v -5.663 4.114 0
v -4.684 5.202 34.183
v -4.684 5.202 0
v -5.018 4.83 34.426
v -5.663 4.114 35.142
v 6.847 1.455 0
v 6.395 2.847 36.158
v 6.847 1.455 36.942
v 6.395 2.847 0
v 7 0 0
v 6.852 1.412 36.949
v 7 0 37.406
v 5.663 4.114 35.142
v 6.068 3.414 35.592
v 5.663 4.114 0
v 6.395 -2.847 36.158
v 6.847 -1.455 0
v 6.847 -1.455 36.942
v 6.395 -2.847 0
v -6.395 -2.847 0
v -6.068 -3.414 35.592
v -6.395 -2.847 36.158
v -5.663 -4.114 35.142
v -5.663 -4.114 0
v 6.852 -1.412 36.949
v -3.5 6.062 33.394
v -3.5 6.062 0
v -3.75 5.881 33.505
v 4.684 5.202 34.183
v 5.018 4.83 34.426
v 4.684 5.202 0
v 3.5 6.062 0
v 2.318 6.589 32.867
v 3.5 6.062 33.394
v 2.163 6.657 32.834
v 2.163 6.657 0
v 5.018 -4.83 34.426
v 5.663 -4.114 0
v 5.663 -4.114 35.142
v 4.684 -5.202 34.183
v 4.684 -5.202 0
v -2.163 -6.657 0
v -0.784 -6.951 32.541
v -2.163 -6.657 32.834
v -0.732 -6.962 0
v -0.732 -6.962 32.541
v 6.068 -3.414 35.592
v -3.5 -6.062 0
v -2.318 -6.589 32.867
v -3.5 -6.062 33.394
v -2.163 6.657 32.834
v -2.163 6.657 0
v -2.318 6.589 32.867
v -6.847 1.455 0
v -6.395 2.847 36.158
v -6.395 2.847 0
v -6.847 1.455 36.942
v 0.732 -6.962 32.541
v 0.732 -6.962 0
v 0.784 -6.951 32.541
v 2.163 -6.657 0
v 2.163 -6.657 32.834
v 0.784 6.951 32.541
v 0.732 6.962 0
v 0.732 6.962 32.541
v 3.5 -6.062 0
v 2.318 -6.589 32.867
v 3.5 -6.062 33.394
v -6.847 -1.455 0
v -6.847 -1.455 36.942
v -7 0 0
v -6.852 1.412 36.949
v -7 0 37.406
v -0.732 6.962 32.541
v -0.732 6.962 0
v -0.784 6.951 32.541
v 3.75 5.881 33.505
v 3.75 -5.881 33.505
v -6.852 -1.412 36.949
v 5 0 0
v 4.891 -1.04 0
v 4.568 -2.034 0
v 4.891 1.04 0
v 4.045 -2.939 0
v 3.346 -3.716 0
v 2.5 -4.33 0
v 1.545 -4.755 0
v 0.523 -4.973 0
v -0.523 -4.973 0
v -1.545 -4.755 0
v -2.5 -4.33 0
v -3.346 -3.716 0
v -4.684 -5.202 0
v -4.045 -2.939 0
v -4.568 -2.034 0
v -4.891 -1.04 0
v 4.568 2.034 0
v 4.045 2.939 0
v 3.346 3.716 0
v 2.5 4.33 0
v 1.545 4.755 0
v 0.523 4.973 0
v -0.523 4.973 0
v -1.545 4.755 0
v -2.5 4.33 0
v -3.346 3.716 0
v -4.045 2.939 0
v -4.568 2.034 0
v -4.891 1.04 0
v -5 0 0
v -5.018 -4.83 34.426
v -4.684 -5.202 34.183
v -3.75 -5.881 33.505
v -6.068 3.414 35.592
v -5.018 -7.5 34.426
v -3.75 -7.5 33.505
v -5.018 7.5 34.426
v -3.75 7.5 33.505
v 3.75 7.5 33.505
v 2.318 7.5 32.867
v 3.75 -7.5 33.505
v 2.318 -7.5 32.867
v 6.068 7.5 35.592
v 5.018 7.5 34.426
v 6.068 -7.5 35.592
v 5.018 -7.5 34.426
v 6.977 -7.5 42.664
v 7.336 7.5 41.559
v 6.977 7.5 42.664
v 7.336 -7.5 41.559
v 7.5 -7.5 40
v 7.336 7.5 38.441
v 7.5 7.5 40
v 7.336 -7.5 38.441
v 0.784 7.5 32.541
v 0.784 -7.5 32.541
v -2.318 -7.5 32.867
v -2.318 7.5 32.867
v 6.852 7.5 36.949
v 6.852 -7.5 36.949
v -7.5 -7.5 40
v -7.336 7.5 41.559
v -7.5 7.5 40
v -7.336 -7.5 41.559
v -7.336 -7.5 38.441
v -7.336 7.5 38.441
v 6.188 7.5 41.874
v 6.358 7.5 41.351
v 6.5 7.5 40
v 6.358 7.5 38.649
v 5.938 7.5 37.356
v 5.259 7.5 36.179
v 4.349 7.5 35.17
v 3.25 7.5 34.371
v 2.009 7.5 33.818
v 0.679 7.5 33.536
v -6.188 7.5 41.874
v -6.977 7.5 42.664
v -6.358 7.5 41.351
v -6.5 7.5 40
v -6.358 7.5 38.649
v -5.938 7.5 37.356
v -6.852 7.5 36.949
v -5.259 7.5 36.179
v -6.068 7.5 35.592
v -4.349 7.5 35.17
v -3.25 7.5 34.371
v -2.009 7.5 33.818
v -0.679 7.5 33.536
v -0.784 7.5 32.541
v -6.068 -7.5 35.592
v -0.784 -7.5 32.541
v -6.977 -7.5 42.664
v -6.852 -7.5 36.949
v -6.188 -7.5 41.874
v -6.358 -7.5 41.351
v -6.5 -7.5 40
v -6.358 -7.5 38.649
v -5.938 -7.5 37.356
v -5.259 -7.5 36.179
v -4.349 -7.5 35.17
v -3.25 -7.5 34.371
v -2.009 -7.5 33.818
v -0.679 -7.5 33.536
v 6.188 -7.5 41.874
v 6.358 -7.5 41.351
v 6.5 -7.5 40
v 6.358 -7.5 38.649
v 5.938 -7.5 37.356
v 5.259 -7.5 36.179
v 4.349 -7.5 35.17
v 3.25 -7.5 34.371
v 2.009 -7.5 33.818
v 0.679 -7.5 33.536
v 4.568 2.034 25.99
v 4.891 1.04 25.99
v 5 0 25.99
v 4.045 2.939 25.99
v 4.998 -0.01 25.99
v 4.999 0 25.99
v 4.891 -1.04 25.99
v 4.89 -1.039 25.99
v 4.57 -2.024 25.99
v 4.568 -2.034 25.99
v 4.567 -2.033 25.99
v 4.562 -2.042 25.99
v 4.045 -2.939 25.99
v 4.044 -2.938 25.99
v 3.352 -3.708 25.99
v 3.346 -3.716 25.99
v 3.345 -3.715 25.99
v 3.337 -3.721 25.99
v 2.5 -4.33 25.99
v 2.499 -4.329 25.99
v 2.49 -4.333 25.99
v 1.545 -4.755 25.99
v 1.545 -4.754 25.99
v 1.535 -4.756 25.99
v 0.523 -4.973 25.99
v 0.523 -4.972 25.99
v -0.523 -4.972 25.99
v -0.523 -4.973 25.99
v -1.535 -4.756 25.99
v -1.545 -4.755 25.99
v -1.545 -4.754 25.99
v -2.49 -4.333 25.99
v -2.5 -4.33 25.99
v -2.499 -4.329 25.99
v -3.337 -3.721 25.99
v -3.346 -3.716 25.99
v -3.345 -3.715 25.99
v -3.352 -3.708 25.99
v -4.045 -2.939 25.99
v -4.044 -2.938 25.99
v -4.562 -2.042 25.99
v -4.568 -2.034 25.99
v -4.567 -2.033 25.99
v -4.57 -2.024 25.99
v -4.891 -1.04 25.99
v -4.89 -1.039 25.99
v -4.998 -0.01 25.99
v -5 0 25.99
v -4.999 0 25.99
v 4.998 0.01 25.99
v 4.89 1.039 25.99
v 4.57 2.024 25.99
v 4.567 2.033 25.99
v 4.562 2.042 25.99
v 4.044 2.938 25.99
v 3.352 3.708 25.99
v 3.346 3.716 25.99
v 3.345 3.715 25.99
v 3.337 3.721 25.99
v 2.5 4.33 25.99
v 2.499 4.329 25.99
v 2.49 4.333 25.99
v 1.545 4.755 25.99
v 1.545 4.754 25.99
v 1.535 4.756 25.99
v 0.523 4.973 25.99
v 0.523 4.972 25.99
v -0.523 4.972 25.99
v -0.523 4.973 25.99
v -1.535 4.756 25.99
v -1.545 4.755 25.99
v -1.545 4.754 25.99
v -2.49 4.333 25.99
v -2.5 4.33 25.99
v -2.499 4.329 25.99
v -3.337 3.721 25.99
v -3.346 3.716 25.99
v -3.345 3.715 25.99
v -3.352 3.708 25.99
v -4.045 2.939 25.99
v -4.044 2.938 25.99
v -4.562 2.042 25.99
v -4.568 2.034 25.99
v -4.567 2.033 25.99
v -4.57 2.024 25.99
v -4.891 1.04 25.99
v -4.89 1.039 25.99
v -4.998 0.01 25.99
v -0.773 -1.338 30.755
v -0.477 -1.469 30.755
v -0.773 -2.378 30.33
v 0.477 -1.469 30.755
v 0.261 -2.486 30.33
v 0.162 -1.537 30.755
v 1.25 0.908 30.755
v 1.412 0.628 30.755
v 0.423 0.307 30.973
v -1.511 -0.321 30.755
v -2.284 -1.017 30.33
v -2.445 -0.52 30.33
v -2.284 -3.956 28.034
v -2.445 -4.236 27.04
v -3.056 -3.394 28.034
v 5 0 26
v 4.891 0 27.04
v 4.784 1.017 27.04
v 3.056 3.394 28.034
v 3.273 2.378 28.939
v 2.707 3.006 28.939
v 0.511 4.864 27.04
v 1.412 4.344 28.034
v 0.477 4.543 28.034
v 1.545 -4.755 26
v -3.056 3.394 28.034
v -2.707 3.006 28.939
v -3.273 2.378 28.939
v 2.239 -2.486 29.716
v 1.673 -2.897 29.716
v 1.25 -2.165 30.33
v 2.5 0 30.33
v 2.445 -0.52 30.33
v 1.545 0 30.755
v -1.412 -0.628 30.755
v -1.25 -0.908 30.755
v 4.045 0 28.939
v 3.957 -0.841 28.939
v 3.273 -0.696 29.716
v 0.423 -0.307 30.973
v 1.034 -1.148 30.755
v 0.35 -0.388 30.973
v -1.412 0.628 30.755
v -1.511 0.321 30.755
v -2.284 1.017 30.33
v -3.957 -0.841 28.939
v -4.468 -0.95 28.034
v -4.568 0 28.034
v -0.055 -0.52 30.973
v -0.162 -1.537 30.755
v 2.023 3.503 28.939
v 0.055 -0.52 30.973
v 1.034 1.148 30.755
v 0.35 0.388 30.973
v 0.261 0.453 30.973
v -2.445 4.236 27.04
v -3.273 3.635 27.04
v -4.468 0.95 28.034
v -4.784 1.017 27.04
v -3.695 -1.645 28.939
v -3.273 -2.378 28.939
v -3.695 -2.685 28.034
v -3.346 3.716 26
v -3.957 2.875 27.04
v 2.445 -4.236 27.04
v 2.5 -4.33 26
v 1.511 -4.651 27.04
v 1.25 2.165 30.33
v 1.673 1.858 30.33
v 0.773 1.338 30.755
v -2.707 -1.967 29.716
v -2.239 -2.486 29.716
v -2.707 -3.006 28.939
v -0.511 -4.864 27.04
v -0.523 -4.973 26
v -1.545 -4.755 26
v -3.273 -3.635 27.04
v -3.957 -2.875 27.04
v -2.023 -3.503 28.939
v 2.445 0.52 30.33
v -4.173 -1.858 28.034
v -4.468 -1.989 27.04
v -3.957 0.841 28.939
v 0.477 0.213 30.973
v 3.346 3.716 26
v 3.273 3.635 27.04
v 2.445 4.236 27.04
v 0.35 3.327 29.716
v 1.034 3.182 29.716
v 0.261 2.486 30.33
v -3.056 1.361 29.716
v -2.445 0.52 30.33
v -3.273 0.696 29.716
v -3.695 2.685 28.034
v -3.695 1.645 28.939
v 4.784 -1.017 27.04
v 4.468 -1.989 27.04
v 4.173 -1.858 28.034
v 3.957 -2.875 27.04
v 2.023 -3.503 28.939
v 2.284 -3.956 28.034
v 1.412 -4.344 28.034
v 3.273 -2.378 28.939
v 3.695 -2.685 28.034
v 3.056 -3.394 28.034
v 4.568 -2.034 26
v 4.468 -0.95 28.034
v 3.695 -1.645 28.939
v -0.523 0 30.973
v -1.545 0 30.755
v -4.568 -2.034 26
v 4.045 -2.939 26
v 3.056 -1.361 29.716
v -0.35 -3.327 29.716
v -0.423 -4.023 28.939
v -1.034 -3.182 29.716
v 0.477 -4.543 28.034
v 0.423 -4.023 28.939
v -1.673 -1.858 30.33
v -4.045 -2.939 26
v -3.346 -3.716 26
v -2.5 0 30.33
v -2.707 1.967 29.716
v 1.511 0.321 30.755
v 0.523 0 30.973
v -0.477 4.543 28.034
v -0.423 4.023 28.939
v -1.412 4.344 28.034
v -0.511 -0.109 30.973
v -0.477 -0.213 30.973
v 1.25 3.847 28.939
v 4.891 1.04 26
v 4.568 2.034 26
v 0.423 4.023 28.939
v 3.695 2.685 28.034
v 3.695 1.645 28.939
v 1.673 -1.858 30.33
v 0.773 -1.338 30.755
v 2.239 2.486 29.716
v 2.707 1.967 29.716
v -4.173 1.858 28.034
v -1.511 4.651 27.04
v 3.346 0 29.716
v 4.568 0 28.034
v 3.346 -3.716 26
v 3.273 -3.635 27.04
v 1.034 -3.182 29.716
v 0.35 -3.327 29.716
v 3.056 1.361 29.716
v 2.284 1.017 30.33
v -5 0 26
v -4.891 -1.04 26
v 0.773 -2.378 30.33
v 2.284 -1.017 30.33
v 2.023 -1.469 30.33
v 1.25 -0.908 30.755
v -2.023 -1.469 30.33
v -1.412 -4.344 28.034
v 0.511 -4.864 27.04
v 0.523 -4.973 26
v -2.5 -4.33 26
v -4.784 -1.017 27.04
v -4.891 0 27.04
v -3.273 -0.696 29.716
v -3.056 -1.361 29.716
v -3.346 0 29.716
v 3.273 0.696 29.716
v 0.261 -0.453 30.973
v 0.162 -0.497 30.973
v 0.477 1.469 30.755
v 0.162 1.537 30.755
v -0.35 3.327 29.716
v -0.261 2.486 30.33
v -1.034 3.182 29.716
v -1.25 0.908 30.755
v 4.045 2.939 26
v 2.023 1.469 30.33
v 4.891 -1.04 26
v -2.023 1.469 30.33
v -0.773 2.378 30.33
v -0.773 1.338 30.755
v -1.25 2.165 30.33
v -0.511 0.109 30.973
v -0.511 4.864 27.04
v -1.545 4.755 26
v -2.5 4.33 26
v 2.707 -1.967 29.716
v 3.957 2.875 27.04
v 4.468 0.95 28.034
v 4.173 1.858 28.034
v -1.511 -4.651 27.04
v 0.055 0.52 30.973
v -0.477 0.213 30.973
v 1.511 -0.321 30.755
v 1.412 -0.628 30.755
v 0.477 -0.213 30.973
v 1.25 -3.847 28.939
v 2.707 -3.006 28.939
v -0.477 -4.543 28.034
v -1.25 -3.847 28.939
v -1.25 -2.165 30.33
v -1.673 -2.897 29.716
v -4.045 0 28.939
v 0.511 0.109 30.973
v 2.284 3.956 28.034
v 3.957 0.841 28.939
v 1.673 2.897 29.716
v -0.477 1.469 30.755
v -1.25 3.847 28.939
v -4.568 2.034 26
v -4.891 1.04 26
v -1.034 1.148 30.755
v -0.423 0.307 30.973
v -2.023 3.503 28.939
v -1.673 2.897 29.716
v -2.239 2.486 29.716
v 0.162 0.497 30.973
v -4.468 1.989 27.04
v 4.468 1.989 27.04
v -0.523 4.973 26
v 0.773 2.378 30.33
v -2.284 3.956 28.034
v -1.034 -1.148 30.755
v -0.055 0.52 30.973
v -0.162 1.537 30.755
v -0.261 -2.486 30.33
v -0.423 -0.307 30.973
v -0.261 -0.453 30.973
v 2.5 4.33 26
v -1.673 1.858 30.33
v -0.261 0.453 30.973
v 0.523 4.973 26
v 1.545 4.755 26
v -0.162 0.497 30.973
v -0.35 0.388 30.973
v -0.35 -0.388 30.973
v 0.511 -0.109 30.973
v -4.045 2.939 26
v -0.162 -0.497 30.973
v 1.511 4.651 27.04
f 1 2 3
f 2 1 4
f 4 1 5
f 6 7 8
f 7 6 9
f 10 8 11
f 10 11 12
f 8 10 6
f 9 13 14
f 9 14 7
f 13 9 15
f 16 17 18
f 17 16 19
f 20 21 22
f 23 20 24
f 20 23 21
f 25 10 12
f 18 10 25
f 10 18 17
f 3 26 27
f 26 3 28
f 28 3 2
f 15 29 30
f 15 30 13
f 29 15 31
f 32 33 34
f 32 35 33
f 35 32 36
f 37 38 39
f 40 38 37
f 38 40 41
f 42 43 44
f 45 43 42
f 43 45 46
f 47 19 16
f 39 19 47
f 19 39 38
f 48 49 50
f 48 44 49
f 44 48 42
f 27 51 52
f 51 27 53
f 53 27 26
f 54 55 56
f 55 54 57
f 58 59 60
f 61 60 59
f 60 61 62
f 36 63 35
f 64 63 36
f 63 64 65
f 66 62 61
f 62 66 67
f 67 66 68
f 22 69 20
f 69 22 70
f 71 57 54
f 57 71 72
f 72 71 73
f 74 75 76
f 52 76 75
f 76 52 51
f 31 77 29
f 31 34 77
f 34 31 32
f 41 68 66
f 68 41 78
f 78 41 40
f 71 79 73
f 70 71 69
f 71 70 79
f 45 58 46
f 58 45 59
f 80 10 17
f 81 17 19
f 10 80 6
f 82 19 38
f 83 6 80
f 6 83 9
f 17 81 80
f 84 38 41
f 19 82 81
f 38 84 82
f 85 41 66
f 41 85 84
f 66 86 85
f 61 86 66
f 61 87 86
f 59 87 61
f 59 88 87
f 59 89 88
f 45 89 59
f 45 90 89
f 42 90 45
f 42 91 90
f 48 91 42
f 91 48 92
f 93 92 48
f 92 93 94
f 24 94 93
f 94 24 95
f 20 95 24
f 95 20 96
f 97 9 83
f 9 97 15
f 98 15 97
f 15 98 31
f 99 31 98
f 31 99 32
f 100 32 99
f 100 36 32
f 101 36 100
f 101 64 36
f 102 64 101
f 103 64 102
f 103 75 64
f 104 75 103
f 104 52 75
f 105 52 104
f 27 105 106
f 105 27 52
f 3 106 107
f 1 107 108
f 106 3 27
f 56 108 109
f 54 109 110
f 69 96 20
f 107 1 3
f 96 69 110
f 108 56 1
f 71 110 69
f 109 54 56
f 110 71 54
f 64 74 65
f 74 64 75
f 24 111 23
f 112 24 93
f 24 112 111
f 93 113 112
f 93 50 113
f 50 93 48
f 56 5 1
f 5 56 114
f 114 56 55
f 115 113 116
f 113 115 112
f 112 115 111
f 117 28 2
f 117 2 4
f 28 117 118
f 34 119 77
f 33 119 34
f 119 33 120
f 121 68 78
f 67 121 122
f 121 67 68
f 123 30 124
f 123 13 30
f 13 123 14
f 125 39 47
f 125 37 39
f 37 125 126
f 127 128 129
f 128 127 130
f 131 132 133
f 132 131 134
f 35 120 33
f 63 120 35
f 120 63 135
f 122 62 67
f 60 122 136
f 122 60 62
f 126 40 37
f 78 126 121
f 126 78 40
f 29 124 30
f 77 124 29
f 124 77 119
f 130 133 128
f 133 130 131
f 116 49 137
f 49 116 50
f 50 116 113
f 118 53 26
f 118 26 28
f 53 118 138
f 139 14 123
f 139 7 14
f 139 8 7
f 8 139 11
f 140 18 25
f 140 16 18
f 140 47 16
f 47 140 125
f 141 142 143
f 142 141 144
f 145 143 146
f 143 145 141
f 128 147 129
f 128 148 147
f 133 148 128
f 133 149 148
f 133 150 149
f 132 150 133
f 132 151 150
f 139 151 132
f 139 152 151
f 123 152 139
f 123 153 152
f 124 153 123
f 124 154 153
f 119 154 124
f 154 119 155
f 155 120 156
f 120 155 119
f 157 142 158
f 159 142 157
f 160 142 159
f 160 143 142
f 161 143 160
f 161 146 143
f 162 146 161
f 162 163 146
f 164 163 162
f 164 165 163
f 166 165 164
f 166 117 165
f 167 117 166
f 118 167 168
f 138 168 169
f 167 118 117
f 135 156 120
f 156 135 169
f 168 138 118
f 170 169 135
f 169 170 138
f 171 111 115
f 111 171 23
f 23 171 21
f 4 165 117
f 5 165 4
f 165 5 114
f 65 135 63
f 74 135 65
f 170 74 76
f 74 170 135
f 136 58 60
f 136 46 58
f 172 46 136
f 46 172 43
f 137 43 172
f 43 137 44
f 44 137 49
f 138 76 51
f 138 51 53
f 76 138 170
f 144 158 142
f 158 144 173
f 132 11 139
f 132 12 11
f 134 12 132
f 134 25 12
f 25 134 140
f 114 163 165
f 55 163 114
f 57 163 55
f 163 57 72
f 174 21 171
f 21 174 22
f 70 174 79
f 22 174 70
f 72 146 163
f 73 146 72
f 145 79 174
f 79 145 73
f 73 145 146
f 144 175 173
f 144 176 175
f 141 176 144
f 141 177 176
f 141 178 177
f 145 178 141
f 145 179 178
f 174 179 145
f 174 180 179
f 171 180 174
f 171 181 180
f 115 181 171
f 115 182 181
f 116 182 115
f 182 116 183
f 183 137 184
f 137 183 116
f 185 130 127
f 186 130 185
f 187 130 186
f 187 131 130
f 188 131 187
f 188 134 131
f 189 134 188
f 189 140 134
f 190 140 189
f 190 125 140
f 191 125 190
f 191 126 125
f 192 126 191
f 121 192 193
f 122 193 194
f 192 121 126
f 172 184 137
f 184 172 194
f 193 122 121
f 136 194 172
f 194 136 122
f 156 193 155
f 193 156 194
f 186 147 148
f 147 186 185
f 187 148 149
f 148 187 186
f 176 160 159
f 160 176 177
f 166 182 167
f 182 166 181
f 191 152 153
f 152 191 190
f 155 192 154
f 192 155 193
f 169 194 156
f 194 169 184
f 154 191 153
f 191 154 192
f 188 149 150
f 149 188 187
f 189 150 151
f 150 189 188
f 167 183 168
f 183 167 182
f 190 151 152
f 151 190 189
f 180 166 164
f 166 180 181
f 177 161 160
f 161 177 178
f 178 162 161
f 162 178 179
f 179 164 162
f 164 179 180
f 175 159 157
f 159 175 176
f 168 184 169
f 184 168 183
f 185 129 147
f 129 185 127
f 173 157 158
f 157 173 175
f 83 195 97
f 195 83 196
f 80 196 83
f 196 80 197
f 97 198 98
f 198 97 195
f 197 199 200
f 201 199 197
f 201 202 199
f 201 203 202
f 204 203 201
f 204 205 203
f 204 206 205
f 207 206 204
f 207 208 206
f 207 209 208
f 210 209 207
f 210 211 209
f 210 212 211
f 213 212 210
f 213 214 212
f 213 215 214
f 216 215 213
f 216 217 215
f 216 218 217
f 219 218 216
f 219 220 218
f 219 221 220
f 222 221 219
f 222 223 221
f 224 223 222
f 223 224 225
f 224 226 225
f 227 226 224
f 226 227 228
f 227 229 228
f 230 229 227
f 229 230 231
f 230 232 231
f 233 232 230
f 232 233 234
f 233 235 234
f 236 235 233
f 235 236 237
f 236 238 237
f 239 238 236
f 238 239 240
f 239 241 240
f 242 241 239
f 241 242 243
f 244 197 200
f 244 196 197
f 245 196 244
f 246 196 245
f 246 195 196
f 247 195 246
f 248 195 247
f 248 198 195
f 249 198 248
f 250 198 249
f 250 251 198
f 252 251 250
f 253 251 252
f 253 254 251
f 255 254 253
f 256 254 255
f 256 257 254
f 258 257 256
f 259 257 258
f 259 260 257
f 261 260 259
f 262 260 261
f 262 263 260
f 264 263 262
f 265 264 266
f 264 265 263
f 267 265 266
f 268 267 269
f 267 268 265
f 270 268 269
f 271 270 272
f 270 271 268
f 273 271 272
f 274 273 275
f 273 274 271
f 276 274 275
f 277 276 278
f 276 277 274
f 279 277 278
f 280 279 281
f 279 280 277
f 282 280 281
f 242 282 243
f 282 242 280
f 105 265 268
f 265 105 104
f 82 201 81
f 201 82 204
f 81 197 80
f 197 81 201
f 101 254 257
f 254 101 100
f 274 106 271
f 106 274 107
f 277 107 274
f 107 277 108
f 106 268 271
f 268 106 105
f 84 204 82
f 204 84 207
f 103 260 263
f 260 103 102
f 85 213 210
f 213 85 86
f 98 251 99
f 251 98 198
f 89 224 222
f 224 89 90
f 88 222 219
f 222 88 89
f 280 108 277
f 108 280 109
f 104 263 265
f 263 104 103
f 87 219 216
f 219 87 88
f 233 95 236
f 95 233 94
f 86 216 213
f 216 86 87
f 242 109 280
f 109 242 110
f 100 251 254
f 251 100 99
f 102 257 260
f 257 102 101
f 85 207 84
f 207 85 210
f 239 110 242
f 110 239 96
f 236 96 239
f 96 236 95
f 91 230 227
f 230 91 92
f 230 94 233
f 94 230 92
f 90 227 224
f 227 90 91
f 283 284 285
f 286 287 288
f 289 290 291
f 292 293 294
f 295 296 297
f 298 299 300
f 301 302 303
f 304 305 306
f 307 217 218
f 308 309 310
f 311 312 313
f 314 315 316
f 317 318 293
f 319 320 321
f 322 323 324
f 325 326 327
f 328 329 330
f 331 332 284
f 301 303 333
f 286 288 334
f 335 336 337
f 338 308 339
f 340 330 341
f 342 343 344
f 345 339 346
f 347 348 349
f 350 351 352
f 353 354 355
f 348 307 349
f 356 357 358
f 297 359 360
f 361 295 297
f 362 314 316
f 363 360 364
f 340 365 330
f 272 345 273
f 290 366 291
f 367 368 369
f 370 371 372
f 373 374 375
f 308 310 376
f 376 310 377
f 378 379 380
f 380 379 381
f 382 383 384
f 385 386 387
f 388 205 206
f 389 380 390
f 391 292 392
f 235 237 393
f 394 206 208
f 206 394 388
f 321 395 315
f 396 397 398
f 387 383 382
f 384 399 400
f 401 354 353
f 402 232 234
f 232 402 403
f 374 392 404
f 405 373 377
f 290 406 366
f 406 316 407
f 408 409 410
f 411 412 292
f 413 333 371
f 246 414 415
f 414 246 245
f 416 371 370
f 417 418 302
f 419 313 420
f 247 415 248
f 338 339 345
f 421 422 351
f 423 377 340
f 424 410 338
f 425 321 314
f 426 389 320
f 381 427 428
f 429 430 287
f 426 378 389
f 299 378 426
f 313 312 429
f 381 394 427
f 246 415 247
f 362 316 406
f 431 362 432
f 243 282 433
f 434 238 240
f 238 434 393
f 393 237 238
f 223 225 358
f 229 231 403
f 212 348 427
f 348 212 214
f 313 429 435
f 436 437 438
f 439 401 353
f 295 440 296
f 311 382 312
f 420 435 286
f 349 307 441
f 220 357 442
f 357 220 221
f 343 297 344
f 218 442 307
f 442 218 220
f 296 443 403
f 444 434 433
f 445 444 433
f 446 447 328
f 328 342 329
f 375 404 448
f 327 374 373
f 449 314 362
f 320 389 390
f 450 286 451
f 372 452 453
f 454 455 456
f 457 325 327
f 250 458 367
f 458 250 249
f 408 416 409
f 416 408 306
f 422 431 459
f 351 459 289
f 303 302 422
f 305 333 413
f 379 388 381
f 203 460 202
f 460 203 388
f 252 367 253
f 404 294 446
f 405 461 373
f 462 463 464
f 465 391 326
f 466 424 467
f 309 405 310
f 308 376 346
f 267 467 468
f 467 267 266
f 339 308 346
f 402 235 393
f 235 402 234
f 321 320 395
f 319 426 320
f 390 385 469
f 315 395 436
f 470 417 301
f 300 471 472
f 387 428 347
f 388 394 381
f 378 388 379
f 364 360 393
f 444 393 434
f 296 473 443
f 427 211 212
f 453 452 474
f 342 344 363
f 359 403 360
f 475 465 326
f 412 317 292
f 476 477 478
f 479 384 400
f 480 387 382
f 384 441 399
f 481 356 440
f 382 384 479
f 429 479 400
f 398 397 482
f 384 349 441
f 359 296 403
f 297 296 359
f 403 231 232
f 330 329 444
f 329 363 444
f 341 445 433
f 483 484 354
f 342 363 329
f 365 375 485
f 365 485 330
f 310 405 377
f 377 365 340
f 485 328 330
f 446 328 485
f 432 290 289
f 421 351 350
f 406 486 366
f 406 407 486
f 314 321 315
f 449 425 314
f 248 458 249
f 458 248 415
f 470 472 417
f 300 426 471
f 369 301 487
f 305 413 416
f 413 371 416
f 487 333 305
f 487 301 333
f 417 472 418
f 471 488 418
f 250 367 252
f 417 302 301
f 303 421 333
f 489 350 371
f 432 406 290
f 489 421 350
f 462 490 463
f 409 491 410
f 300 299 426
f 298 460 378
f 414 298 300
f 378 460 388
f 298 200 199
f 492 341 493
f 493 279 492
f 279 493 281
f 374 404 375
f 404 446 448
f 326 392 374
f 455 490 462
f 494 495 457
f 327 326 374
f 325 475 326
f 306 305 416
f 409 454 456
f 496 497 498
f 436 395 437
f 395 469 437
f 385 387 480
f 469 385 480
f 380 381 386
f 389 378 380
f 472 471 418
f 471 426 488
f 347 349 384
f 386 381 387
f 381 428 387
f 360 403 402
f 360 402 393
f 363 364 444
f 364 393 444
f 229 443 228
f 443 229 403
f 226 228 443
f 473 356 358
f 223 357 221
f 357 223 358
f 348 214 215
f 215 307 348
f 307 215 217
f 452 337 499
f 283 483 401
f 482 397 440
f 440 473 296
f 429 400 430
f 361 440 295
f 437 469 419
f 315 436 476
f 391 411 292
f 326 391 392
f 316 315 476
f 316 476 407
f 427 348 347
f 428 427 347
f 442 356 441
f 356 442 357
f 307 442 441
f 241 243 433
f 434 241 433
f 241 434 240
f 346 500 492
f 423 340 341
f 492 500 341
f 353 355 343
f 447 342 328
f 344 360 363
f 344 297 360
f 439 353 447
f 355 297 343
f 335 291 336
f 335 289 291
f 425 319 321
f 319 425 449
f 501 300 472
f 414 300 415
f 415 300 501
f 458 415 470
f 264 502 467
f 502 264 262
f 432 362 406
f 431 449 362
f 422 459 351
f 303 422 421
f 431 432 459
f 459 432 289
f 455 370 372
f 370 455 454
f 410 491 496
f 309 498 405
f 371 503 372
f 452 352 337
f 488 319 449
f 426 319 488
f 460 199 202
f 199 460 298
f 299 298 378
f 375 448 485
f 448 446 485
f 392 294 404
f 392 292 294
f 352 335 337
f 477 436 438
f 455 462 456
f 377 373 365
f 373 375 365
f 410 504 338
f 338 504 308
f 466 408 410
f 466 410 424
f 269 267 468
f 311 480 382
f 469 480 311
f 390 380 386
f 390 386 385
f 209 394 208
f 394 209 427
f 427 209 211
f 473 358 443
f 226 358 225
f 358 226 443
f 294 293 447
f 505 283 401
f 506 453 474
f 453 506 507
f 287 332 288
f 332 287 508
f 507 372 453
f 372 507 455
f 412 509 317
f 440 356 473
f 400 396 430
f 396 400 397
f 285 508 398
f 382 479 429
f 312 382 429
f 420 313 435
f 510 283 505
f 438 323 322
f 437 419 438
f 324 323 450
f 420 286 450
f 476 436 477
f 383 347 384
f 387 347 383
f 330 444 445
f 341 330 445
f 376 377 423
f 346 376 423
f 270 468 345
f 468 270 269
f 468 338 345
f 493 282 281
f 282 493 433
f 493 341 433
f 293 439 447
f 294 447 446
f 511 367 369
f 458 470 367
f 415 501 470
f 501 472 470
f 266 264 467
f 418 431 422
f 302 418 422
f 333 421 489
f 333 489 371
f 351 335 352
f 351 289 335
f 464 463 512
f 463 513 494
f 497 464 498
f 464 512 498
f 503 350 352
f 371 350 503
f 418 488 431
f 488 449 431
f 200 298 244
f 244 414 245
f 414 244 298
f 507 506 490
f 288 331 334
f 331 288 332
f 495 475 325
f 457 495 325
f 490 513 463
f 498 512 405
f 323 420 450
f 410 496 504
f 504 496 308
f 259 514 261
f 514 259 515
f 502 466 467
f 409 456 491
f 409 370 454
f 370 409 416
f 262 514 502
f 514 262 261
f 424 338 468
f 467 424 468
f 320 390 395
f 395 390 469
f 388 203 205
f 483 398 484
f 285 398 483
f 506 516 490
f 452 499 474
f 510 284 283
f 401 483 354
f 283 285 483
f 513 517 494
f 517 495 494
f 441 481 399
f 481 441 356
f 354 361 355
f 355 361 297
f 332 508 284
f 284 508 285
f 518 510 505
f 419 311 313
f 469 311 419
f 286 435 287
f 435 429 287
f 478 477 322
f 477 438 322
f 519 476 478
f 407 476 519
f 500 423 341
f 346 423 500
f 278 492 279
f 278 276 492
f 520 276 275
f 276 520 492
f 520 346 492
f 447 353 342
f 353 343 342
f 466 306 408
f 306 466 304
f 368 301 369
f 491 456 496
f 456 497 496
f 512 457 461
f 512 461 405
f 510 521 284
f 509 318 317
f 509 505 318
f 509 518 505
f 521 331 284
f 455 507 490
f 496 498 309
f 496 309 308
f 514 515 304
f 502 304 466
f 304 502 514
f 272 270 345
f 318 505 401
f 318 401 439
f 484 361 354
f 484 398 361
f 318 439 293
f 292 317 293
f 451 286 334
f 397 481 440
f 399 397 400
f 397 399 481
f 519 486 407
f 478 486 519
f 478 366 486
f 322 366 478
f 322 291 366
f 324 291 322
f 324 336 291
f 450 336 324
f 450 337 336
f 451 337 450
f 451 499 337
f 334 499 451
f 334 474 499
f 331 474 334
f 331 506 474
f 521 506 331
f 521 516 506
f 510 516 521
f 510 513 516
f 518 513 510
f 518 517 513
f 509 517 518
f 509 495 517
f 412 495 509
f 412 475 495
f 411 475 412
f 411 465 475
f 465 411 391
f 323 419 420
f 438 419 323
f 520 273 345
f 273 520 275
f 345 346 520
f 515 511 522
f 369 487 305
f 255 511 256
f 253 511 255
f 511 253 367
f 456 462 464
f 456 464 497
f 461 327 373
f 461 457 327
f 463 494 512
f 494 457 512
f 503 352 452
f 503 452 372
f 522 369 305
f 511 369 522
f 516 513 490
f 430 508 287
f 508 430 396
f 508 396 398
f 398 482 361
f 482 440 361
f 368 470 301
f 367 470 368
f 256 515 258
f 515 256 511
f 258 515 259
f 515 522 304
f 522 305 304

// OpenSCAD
$fn=30;

ht=47;

difference()
{
    union()
    {
        cylinder(h=ht-14/2,d=14);
    
        translate([0,0,ht-14/2])
        rotate([90,0,0])
        cylinder(h=15,d=15,center=true);
    };

    translate([0,0,ht-14/2])
    rotate([90,0,0])
    cylinder(h=16,d=13,center=true);
    
    translate([0,0,ht])
    rotate([0,45,0])
    cube([16,16,16], center=true);
    
    translate([0,0,-0.01])
    cylinder(h=ht-3*14/2,d=10);
    
    translate([0,0,ht-3*14/2])
    sphere(d=10, center=true);
};
